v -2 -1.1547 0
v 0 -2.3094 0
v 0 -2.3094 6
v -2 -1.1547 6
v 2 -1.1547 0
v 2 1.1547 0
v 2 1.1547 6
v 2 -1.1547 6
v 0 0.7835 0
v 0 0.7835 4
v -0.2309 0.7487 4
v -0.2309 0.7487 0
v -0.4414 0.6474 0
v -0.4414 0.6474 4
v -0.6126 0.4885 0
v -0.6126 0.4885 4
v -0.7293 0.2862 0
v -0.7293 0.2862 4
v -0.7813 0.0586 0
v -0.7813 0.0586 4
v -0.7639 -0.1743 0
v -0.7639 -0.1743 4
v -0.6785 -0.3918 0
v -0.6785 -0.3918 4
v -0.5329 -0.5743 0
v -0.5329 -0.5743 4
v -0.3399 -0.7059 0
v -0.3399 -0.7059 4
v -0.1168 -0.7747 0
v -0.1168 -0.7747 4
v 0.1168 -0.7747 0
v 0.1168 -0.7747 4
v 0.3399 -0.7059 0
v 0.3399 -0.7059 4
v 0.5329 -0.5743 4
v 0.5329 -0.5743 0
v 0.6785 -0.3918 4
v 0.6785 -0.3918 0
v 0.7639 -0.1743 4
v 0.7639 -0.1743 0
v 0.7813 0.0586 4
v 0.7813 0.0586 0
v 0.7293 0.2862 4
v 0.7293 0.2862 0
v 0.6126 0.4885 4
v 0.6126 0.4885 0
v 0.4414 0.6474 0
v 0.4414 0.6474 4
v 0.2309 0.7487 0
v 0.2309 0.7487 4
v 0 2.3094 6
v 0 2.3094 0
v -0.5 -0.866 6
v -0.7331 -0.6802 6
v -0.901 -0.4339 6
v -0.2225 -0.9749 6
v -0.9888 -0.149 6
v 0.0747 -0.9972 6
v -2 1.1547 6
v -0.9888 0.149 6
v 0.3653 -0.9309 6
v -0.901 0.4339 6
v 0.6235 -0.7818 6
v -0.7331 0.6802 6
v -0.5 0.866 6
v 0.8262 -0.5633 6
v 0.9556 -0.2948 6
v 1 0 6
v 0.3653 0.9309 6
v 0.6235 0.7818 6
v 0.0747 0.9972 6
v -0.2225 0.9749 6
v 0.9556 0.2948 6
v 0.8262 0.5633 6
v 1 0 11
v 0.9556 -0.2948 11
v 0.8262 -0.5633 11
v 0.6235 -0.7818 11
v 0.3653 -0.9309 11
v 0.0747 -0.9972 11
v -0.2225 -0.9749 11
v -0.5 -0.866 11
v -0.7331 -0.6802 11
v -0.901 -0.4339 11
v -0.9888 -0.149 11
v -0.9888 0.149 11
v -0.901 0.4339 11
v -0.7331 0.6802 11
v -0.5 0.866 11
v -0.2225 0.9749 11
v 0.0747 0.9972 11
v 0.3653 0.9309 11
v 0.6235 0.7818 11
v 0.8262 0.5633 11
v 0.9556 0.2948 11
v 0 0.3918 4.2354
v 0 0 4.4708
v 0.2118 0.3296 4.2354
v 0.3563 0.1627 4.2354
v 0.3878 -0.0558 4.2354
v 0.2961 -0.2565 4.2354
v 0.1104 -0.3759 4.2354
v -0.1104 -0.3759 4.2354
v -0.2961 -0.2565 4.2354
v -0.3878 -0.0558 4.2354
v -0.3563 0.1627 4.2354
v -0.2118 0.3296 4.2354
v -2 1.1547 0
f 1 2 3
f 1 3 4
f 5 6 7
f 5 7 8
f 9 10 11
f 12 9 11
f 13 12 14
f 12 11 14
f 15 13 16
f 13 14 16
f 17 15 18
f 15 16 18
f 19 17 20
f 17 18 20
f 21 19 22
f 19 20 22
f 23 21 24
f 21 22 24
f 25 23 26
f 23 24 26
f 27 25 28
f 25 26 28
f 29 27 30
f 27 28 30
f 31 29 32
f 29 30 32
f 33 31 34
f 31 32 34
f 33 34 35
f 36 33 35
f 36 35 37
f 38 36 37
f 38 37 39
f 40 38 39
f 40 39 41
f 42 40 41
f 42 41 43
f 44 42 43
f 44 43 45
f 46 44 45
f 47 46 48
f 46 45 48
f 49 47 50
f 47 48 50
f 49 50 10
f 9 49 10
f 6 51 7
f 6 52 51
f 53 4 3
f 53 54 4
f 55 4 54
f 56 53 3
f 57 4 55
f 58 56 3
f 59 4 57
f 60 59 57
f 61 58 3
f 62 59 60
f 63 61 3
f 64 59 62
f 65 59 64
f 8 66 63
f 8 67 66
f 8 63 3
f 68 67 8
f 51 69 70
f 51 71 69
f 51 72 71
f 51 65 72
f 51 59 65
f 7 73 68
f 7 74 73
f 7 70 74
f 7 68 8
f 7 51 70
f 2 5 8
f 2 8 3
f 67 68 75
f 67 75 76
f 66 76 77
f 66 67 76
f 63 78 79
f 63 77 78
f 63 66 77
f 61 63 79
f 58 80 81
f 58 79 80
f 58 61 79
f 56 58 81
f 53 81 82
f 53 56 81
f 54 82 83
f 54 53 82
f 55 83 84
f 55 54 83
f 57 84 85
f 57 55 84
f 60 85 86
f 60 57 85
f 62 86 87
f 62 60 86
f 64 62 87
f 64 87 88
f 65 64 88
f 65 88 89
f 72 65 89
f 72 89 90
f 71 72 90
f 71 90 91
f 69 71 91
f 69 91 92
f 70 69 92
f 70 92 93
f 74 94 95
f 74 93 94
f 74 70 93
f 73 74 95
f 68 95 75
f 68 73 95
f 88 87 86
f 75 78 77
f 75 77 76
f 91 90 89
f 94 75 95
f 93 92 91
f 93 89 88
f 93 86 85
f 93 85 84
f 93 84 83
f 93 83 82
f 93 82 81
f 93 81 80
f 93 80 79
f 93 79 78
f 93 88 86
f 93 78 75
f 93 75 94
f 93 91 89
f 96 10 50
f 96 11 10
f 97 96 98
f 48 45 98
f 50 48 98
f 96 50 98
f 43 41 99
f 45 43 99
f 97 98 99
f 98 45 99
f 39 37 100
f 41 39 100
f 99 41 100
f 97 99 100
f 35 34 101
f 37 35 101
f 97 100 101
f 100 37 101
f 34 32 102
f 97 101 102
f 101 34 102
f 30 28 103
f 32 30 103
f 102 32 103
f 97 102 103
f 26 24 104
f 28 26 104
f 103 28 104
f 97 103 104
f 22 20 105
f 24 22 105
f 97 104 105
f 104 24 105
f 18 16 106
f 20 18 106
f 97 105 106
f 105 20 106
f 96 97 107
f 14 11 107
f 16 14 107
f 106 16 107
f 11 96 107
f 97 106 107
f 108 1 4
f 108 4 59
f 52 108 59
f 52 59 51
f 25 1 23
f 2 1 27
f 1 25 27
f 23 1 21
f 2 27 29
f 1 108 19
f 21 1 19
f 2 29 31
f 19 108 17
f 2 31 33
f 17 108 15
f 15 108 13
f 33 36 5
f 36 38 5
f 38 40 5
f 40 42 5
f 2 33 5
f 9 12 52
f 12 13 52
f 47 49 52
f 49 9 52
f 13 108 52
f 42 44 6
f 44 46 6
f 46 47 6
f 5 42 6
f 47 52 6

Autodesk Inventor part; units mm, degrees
ref_plane "YZ Plane" through (0, 0, 0) normal (1, 0, 0) x (0, 1, 0)
ref_plane "XZ Plane" through (0, 0, 0) normal (0, 1, 0) x (-1, 0, 0)
ref_plane "XY Plane" through (0, 0, 0) normal (0, 0, 1) x (1, 0, 0)
sketch "スケッチ1" plane through (0, 0, 0) normal (0, 0, 1) x (1, 0, 0)
  line L0 (0, 2.3094) -> (2, 1.1547)
  line L1 (2, 1.1547) -> (2, -1.1547)
  line L2 (2, -1.1547) -> (0, -2.3094)
  line L3 (0, -2.3094) -> (-2, -1.1547)
  line L4 (-2, -1.1547) -> (-2, 1.1547)
  line L5 (-2, 1.1547) -> (0, 2.3094)
  point P0 (0, 0)
  point P1 (0, 0)
  dimension "d0" = 4
extrude "押し出し1" add sketch "スケッチ1" along normal blind 6
sketch "スケッチ2" plane through (0, 0, 6) normal (0, 0, 1) x (1, 0, 0)
  circle A0 centre (0, 0) radius 1
  dimension "d3" = 2
extrude "押し出し2" add sketch "スケッチ2" along normal blind 5
thread "ねじ1" size "M2x0.4" class "6g" standard "ANSI Metric M Profile" full length
sketch "スケッチ3" plane through (0, 0, 0) normal (0, 0, -1) x (-1, 0, 0)
  point P0 (0, 0)
hole "穴1" at (0, 0, 0) direction (0, 0, 1) diameter 1.567 depth 4 tip angle 118 thread size "M2x0.4" class "6H" standard "ISO Metric profile"
properties part number "ジュラコンスペーサー（六角）_BS-2006E" material "アセタール樹脂、白"
